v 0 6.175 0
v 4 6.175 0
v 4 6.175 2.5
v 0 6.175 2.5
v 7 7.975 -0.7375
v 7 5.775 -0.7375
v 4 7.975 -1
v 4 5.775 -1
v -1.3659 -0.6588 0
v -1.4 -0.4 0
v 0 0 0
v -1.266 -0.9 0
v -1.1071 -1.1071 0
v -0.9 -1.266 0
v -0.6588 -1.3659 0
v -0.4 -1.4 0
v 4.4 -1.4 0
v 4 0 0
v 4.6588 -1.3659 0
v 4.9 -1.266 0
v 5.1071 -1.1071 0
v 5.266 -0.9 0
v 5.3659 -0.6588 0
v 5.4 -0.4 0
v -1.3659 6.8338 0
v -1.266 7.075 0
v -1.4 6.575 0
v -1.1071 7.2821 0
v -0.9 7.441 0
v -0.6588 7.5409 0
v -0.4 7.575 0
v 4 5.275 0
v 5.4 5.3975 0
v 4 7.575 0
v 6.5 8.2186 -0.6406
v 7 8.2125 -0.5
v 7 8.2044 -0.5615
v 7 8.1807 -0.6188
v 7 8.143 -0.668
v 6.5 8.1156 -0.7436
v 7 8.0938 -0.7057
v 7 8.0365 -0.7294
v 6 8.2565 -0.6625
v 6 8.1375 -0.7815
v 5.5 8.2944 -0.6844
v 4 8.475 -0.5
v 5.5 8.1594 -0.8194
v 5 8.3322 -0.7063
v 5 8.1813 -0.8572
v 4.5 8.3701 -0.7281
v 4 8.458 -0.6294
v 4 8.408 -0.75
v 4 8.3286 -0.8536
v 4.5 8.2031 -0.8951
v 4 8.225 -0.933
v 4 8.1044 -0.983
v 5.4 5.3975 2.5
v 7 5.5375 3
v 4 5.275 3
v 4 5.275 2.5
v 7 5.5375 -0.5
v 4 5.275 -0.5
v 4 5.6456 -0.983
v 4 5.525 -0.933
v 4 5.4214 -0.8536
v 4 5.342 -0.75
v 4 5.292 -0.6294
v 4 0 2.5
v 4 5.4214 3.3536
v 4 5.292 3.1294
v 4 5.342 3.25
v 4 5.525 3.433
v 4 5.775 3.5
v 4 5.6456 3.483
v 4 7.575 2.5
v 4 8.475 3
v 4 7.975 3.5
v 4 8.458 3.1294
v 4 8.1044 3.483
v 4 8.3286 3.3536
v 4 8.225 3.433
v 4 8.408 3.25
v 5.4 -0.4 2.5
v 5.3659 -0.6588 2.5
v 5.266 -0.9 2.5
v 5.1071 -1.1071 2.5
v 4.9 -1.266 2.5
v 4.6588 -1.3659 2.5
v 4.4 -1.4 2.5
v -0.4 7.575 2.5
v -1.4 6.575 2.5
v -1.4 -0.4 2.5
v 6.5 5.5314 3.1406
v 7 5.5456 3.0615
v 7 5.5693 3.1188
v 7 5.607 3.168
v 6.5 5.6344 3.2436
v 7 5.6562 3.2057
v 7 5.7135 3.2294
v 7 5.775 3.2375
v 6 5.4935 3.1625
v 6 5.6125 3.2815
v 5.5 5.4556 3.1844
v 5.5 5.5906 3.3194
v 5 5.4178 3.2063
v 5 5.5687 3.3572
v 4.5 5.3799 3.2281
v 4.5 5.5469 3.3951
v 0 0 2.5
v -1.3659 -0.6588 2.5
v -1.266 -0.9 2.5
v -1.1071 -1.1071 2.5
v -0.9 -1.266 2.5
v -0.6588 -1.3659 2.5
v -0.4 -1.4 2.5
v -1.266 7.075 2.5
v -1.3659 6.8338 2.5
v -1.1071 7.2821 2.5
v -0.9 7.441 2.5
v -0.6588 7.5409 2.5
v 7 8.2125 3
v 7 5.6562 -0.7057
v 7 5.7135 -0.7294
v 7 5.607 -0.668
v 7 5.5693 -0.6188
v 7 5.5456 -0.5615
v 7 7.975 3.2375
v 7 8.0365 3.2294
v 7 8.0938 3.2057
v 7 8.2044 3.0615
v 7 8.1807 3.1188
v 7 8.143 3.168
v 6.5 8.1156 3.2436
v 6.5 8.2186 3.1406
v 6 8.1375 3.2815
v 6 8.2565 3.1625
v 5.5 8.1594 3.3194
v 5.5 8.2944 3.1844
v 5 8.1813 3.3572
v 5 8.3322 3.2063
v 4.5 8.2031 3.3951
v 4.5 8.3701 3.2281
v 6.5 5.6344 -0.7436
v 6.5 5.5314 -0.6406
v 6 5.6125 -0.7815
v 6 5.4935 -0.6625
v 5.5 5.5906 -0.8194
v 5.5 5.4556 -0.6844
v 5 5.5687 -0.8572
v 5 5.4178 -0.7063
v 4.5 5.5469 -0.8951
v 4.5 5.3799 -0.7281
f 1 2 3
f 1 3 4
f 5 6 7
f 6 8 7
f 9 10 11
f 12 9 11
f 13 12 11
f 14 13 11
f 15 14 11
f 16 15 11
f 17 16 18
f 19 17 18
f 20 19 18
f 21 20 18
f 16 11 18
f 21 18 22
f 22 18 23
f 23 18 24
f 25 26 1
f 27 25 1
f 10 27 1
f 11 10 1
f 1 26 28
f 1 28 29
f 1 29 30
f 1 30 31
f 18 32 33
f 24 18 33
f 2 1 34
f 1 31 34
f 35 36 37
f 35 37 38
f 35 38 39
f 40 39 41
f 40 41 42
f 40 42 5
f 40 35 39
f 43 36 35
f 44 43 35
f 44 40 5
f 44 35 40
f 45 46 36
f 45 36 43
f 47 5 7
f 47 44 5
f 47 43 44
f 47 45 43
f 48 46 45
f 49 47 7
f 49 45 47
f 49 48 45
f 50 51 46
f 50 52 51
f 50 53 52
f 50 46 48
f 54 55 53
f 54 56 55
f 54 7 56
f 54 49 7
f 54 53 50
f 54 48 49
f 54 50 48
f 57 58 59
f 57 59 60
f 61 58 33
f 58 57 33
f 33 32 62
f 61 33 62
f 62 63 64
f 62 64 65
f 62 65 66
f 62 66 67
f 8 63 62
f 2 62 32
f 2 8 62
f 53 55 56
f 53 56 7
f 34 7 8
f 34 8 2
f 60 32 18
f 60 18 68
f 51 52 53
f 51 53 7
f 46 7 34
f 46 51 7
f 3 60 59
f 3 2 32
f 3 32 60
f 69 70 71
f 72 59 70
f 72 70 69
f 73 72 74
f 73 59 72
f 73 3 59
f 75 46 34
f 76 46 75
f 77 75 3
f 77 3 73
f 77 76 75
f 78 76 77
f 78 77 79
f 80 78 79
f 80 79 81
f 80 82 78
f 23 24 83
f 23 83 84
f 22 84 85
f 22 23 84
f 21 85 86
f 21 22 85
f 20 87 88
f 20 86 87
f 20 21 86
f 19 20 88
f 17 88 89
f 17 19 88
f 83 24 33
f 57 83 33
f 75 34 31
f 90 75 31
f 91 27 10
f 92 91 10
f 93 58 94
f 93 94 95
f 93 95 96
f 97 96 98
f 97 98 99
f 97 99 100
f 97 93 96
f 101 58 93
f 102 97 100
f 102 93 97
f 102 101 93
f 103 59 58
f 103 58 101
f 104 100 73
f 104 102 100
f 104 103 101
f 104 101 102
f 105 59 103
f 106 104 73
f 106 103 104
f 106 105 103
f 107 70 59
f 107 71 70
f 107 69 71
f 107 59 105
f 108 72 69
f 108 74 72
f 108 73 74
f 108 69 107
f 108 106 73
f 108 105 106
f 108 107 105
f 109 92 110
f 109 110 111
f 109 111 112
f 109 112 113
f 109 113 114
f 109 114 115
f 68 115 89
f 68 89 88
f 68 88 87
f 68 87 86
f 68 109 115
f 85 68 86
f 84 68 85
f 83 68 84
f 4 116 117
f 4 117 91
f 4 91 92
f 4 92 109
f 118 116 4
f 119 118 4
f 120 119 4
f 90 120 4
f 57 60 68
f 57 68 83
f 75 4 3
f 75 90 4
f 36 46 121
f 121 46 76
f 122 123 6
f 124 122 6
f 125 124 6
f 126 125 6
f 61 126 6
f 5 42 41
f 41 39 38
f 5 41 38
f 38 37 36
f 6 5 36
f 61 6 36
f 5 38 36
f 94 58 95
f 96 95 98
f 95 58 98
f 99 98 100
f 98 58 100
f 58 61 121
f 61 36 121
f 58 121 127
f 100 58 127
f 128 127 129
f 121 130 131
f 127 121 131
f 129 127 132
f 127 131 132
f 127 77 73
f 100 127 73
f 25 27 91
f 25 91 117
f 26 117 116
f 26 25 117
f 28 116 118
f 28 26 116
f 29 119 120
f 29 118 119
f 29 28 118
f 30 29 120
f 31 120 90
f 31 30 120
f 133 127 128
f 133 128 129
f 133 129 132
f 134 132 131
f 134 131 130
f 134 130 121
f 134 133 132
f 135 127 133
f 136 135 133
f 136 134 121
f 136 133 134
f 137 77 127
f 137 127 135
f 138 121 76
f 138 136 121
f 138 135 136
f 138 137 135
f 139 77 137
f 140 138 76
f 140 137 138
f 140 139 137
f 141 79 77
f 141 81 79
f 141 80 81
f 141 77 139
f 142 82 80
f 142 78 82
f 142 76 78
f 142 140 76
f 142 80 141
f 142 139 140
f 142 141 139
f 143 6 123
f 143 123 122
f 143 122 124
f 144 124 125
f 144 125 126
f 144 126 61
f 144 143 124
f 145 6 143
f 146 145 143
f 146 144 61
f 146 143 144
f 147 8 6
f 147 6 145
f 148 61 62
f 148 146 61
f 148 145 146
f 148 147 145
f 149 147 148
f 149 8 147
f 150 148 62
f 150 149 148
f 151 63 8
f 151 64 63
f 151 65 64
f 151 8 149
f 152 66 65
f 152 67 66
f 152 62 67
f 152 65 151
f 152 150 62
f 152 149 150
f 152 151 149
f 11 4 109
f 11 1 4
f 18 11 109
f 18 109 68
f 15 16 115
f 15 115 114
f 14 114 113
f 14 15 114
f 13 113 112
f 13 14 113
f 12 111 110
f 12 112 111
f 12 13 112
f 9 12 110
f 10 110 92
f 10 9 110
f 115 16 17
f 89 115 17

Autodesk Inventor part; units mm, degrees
ref_plane "YZ Plane" through (0, 0, 0) normal (1, 0, 0) x (0, 1, 0)
ref_plane "XZ Plane" through (0, 0, 0) normal (0, 1, 0) x (-1, 0, 0)
ref_plane "XY Plane" through (0, 0, 0) normal (0, 0, 1) x (1, 0, 0)
sketch "Sketch1" plane through (0, 0, 0) normal (0, 0, 1) x (1, 0, 0)
  line L0 (0, 0) -> (4, 0)
  line L1 (4, 0) -> (4, 6.175)
  line L2 (4, 6.175) -> (0, 6.175)
  line L3 (0, 6.175) -> (0, 0)
  line L4 (-0.4, -1.4) -> (4.4, -1.4)
  line L5 (5.4, -0.4) -> (5.4, 7.575)
  line L6 (5.4, 7.575) -> (-0.4, 7.575)
  line L7 (-1.4, 6.575) -> (-1.4, -0.4)
  arc A0 (-0.4, 7.575) -> (-1.4, 6.575) centre (-0.4, 6.575) ccw
  arc A1 (-1.4, -0.4) -> (-0.4, -1.4) centre (-0.4, -0.4) ccw
  arc A2 (4.4, -1.4) -> (5.4, -0.4) centre (4.4, -0.4) ccw
  point P0 (-1.4, -1.4)
  point P1 (5.4, -1.4)
  point P2 (-1.4, 7.575)
  dimension "d0" = 4
  dimension "d1" = 6.175
  dimension "d2" = 1.4
  dimension "d5" = 1
extrude "Extrusion1" add sketch "Sketch1" along normal blind 2.5
sketch "草圖3" plane through (4, 6.175, 0) normal (-1, 0, 0) x (0, 0, 1)
  line L0 (0, -6.175) -> (0, 0) projected
  line L1 (-0.5, 2.3) -> (3, 2.3)
  line L2 (3.5, 1.8) -> (3.5, -0.4)
  line L3 (3, -0.9) -> (-0.5, -0.9)
  line L4 (-1, -0.4) -> (-1, 1.8)
  line L5 (0, -7.575) -> (2.5, -7.575) projected
  arc A0 (-0.5, 2.3) -> (-1, 1.8) centre (-0.5, 1.8) ccw
  arc A1 (-1, -0.4) -> (-0.5, -0.9) centre (-0.5, -0.4) ccw
  arc A2 (3, -0.9) -> (3.5, -0.4) centre (3, -0.4) ccw
  arc A3 (3.5, 1.8) -> (3, 2.3) centre (3, 1.8) ccw
  point P0 (-1, 2.3)
  point P1 (3.5, -0.9)
  point P2 (3.5, 2.3)
  dimension "d13" = 4.5
  dimension "d15" = 3.2
  dimension "d16" = 1
  dimension "d17" = 6.675
  dimension "d18" = 0.5
extrude "擠出3" add sketch "草圖3" against normal blind 3 draft -5
properties part number "fastener_04"
